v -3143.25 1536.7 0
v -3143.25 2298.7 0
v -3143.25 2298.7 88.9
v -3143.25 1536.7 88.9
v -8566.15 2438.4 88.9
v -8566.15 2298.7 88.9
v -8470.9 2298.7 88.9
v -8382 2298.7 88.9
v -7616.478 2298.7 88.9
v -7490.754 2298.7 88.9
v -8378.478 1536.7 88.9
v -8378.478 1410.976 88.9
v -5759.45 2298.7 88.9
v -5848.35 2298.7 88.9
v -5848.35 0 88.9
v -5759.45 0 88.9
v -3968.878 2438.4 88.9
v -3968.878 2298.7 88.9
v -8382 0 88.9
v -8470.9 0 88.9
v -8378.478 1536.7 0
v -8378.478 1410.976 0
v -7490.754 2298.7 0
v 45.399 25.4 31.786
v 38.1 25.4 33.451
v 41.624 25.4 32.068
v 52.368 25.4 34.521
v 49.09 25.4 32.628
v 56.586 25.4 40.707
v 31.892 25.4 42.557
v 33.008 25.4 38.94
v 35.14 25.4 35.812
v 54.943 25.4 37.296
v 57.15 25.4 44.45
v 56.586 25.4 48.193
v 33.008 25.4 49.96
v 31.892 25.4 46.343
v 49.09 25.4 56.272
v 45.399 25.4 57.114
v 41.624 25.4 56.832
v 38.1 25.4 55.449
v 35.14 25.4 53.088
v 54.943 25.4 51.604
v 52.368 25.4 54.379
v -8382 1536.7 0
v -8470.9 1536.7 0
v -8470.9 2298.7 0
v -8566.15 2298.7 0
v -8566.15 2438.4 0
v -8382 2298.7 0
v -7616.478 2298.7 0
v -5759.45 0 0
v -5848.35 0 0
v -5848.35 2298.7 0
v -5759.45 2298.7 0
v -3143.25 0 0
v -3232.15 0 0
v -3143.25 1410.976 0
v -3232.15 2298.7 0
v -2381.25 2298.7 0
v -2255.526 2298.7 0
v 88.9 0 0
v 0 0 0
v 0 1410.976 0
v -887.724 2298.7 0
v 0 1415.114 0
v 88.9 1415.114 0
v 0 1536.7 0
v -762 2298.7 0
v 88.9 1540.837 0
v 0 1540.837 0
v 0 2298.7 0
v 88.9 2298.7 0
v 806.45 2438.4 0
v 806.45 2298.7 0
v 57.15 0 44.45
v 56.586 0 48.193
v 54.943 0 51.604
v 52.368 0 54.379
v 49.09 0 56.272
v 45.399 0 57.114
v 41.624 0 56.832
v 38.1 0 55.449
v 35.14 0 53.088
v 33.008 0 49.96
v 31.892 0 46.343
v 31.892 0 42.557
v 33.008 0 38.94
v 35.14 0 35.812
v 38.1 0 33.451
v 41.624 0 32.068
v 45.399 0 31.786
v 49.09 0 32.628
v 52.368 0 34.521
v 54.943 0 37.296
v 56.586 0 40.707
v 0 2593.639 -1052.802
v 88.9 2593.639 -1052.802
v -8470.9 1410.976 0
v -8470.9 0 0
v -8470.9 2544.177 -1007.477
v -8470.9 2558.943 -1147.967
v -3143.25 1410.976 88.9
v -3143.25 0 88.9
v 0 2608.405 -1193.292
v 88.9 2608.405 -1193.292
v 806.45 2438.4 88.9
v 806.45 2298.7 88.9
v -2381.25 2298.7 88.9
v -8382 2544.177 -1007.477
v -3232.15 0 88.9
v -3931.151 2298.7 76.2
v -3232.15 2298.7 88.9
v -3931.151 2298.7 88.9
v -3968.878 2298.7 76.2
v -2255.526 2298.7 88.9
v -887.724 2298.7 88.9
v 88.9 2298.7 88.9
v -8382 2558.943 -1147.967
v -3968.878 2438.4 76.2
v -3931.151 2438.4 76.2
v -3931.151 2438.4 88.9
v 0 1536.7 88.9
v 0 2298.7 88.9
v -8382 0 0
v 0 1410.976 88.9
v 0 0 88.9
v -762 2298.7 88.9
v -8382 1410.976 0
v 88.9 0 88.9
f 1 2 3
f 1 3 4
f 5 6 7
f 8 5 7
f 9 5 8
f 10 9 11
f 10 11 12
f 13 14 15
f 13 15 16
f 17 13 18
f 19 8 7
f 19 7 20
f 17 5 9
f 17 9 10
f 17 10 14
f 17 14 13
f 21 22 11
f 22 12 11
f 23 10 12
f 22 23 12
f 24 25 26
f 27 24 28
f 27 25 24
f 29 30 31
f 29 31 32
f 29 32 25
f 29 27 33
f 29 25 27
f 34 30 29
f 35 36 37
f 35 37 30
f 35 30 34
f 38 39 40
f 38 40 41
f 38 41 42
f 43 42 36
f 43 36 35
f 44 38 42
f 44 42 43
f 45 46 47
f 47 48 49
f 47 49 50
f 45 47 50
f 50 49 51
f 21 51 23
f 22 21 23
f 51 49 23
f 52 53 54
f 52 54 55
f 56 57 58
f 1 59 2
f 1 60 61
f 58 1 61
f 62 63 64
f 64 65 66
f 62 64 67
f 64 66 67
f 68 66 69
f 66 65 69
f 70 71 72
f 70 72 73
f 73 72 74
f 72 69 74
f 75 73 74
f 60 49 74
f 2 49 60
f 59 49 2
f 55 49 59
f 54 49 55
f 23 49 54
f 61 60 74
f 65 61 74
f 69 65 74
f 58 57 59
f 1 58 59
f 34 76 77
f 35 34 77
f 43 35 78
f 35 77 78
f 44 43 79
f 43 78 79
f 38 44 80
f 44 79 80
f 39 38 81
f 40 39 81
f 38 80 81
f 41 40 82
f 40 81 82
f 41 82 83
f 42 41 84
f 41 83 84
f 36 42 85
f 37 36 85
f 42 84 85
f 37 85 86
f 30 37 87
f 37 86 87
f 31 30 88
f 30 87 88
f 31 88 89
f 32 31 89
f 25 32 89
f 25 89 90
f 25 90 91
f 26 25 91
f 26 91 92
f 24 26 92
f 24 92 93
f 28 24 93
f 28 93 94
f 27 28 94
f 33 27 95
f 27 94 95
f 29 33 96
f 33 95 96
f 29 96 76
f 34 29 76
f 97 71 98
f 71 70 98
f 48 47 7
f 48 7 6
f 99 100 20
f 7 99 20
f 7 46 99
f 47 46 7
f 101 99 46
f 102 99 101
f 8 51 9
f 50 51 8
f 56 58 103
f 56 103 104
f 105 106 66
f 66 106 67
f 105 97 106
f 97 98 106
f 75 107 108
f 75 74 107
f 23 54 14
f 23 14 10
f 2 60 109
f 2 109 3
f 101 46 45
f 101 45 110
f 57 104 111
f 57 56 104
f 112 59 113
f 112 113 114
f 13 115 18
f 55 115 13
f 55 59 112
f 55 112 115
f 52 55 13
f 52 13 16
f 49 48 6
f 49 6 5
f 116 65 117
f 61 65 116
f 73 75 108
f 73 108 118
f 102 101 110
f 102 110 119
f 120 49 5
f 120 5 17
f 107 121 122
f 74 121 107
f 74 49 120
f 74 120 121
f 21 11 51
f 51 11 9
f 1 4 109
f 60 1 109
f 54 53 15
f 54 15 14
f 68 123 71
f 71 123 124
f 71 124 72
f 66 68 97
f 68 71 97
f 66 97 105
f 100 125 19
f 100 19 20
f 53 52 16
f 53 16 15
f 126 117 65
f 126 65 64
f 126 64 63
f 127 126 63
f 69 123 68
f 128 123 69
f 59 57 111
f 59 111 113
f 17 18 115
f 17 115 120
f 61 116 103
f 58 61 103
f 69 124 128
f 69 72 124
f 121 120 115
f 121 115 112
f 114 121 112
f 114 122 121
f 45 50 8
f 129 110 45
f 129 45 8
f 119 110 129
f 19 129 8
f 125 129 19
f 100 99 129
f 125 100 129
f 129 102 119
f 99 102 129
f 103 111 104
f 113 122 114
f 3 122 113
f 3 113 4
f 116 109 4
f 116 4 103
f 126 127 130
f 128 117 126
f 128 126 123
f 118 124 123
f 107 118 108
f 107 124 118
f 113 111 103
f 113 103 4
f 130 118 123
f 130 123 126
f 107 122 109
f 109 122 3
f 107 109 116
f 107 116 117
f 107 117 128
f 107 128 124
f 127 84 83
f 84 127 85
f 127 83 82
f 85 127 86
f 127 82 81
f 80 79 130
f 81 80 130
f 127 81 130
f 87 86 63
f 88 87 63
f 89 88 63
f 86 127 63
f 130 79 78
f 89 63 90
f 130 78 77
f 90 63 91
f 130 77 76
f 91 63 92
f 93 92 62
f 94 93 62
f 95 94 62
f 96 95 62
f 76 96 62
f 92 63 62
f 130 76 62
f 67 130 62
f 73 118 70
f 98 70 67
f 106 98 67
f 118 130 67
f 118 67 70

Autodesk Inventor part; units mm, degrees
ref_plane "YZ Plane" through (0, 0, 0) normal (1, 0, 0) x (0, 1, 0)
ref_plane "XZ Plane" through (0, 0, 0) normal (0, 1, 0) x (-1, 0, 0)
ref_plane "XY Plane" through (0, 0, 0) normal (0, 0, 1) x (1, 0, 0)
sketch "Sketch1" plane through (0, 0, 0) normal (0, 0, 1) x (1, 0, 0)
  line L0 (0, 0) -> (88.9, 0)
  line L1 (88.9, 0) -> (88.9, 2298.7)
  line L2 (88.9, 2298.7) -> (0, 2298.7)
  line L3 (0, 2298.7) -> (0, 0)
  line L4 (44.45, 2298.7) -> (806.45, 2298.7) construction
  line L5 (806.45, 2298.7) -> (-8566.15, 2298.7)
  line L6 (-8566.15, 2298.7) -> (-8566.15, 2438.4)
  line L7 (-8566.15, 2438.4) -> (806.45, 2438.4)
  line L8 (806.45, 2438.4) -> (806.45, 2298.7)
  line L9 (-3143.25, 0) -> (-3232.15, 0)
  line L10 (-3232.15, 0) -> (-3232.15, 2298.7)
  line L11 (-3232.15, 2298.7) -> (-3143.25, 2298.7)
  line L12 (-3143.25, 2298.7) -> (-3143.25, 0)
  line L13 (-5759.45, 0) -> (-5848.35, 0)
  line L14 (-5848.35, 0) -> (-5848.35, 2298.7)
  line L15 (-5848.35, 2298.7) -> (-5759.45, 2298.7)
  line L16 (-5759.45, 2298.7) -> (-5759.45, 0)
  line L17 (-8382, 0) -> (-8470.9, 0)
  line L18 (-8470.9, 0) -> (-8470.9, 2298.7)
  line L19 (-8470.9, 2298.7) -> (-8382, 2298.7)
  line L20 (-8382, 2298.7) -> (-8382, 0)
  line L21 (0, 1536.7) -> (1081.4669, 1536.7) construction
  line L22 (-3187.7, 2298.7) -> (-3187.7, 0) construction
  line L23 (-3232.15, 1745.1837) -> (-3232.15, 1870.9072)
  line L24 (-4141.2663, 2298.7) -> (-4015.5428, 2298.7)
  line L25 (-3143.25, 1745.1837) -> (-3143.25, 1870.9072)
  line L26 (-2234.1337, 2298.7) -> (-2359.8572, 2298.7)
  line L27 (-8382, 1745.1837) -> (-8382, 1870.9072)
  point P0 (-887.7236, 2298.7)
  point P1 (0, 1766.5764)
  dimension "d0" = 88.9
  dimension "d1" = 2298.7
  dimension "d2" = 762
  dimension "d3" = 9372.6
  dimension "d4" = 139.7
  dimension "d5" = 88.9
  dimension "d6" = 3232.15
  dimension "d7" = 88.9
  dimension "d8" = 2616.2
  dimension "d9" = 88.9
  dimension "d10" = 2622.55
  dimension "d12" = 762
extrude "Extrusion1" add sketch "Sketch1" along normal blind 88.9
sketch "Sketch4" plane through (0, 0, 88.9) normal (0, 0, 1) x (1, 0, 0)
  line L0 (-3232.15, 2298.7) -> (-3232.15, 0) projected
  line L1 (-3232.15, 0) -> (-3143.25, 0) projected
  line L2 (-3143.25, 0) -> (-3143.25, 2298.7) projected
  line L3 (-3143.25, 2298.7) -> (0, 2298.7) projected
  line L4 (0, 2298.7) -> (0, 0) projected
  line L5 (-8382, 2298.7) -> (-5848.35, 2298.7) projected
  line L6 (-5759.45, 2298.7) -> (-3232.15, 2298.7) projected
  line L7 (0, 1536.7) -> (-762, 2298.7)
  line L8 (0, 1536.7) -> (1437.5812, 1536.7) construction
  line L9 (-887.7236, 2298.7) -> (-28.2137, 1439.1901)
  line L10 (-28.2137, 1439.1901) -> (0, 1410.9764)
  line L11 (0, 1410.9764) -> (0, 1536.7)
  line L12 (-762, 2298.7) -> (-887.7236, 2298.7)
  line L13 (-3232.15, 1536.7) -> (-1794.5688, 1536.7) construction
  line L14 (-3232.15, 1410.9764) -> (-3232.15, 1536.7)
  line L15 (-3994.15, 2298.7) -> (-4119.8736, 2298.7)
  line L16 (-2769.5485, 2298.7) -> (-2769.5485, 1149.35) construction
  line L17 (-7616.4778, 2298.7) -> (-7490.7542, 2298.7)
  line L18 (-7490.7542, 2298.7) -> (-8350.2641, 1439.1901)
  line L19 (-8350.2641, 1439.1901) -> (-8378.4778, 1410.9764)
  line L20 (-8378.4778, 1410.9764) -> (-8378.4778, 1536.7)
  line L21 (-8378.4778, 1536.7) -> (-7616.4778, 2298.7)
  line L22 (-3187.7, 0) -> (-3187.7, 2254.8512) construction
  line L23 (-2381.25, 2298.7) -> (-2255.5264, 2298.7)
  line L24 (-2255.5264, 2298.7) -> (-3115.0363, 1439.1901)
  line L25 (-3115.0363, 1439.1901) -> (-3143.25, 1410.9764)
  line L26 (-3143.25, 1410.9764) -> (-3143.25, 1536.7)
  line L27 (-3143.25, 1536.7) -> (-2381.25, 2298.7)
  dimension "d23" = 135
  dimension "d24" = 762
extrude "Extrusion4" add sketch "Sketch4" against normal blind 88.9 contours L3 L7 L4 L10 L9 | L2 L27 L3 L24 L25 | L5 L18 L19 L20 L21
sketch "Sketch5" plane through (0, 0, 0) normal (0, -1, 0) x (1, 0, 0)
  circle A0 centre (44.45, 44.45) radius 12.7
  dimension "d29" = 25.4
extrude "Extrusion5" cut sketch "Sketch5" against normal blind 25.4
sketch "Sketch7" plane through (-8470.9, 0, 0) normal (-1, 0, 0) x (0, 0, 1)
  line L0 (88.9, 2298.7) -> (88.9, 0) projected
  line L1 (0, 2298.7) -> (88.9, 2298.7) projected
  line L2 (0, 2298.7) -> (0, 0) projected
  line L3 (44.45, 2298.7) -> (44.45, 1217.0761) construction
  line L4 (0, 1536.7) -> (-898.0256, 2434.7256)
  line L5 (-960.8874, 2371.8638) -> (-241.618, 1652.5944)
  line L6 (-241.618, 1652.5944) -> (0, 1410.9764)
  line L7 (-960.8874, 2371.8638) -> (-1023.7492, 2434.7256)
  line L8 (0, 1536.7) -> (0, 1410.9764)
  line L9 (-898.0256, 2434.7256) -> (-1007.477, 2544.177)
  line L10 (-1007.477, 2544.177) -> (-1147.9666, 2558.943)
  line L11 (-1023.7492, 2434.7256) -> (-1147.9666, 2558.943)
  point P0 (88.9, 1536.7)
  point P1 (88.9, 1410.9764)
  dimension "d55" = 154.7876
  dimension "d56" = 141
extrude "Extrusion7" add sketch "Sketch7" against normal blind 88.9
sketch "Sketch8" plane through (88.9, 0, 0) normal (1, 0, 0) x (0, 0, -1)
  line L0 (-88.9, 0) -> (-88.9, 2298.7) projected
  line L1 (-88.9, 1540.8372) -> (1181.1, 1540.8372) construction
  line L2 (0, 0) -> (0, 2298.7) projected
  line L3 (0, 2298.7) -> (-88.9, 2298.7) projected
  line L4 (-44.45, 2298.7) -> (-44.45, 1189.3242) construction
  line L5 (0, 1540.8372) -> (898.0256, 2438.8628)
  line L6 (960.8874, 2376.001) -> (34.1715, 1449.2851)
  line L7 (34.1715, 1449.2851) -> (0, 1415.1136)
  line L8 (0, 1540.8372) -> (0, 1415.1136)
  line L9 (960.8874, 2376.001) -> (1023.7492, 2438.8628)
  line L10 (898.0256, 2438.8628) -> (1052.8021, 2593.6393)
  line L11 (1052.8021, 2593.6393) -> (1193.2917, 2608.4053)
  line L12 (1023.7492, 2438.8628) -> (1193.2917, 2608.4053)
  point P0 (-88.9, 1415.1136)
  dimension "d53" = 141
  dimension "d54" = 154.7765
extrude "Extrusion8" add sketch "Sketch8" against normal blind 88.9
sketch "Sketch9" plane through (0, 0, 88.9) normal (0, 0, 1) x (1, 0, 0)
  line L0 (806.45, 2298.7) -> (806.45, 2438.4) projected
  line L1 (806.45, 2438.4) -> (-8566.15, 2438.4) projected
  line L2 (-5759.45, 2298.7) -> (-3232.15, 2298.7) projected
  line L3 (-3949.7, 2438.4) -> (-3949.7, 2298.7) construction
  line L4 (-3968.8785, 2438.4) -> (-3931.1509, 2438.4)
  line L5 (-3931.1509, 2438.4) -> (-3931.1509, 2298.7)
  line L6 (-3931.1509, 2298.7) -> (-3968.8785, 2298.7)
  line L7 (-3968.8785, 2298.7) -> (-3968.8785, 2438.4)
  dimension "d50" = 4756.15
extrude "Extrusion9" cut sketch "Sketch9" against normal blind 12.7
properties part number "highSide" material "Wood (Birch)"
